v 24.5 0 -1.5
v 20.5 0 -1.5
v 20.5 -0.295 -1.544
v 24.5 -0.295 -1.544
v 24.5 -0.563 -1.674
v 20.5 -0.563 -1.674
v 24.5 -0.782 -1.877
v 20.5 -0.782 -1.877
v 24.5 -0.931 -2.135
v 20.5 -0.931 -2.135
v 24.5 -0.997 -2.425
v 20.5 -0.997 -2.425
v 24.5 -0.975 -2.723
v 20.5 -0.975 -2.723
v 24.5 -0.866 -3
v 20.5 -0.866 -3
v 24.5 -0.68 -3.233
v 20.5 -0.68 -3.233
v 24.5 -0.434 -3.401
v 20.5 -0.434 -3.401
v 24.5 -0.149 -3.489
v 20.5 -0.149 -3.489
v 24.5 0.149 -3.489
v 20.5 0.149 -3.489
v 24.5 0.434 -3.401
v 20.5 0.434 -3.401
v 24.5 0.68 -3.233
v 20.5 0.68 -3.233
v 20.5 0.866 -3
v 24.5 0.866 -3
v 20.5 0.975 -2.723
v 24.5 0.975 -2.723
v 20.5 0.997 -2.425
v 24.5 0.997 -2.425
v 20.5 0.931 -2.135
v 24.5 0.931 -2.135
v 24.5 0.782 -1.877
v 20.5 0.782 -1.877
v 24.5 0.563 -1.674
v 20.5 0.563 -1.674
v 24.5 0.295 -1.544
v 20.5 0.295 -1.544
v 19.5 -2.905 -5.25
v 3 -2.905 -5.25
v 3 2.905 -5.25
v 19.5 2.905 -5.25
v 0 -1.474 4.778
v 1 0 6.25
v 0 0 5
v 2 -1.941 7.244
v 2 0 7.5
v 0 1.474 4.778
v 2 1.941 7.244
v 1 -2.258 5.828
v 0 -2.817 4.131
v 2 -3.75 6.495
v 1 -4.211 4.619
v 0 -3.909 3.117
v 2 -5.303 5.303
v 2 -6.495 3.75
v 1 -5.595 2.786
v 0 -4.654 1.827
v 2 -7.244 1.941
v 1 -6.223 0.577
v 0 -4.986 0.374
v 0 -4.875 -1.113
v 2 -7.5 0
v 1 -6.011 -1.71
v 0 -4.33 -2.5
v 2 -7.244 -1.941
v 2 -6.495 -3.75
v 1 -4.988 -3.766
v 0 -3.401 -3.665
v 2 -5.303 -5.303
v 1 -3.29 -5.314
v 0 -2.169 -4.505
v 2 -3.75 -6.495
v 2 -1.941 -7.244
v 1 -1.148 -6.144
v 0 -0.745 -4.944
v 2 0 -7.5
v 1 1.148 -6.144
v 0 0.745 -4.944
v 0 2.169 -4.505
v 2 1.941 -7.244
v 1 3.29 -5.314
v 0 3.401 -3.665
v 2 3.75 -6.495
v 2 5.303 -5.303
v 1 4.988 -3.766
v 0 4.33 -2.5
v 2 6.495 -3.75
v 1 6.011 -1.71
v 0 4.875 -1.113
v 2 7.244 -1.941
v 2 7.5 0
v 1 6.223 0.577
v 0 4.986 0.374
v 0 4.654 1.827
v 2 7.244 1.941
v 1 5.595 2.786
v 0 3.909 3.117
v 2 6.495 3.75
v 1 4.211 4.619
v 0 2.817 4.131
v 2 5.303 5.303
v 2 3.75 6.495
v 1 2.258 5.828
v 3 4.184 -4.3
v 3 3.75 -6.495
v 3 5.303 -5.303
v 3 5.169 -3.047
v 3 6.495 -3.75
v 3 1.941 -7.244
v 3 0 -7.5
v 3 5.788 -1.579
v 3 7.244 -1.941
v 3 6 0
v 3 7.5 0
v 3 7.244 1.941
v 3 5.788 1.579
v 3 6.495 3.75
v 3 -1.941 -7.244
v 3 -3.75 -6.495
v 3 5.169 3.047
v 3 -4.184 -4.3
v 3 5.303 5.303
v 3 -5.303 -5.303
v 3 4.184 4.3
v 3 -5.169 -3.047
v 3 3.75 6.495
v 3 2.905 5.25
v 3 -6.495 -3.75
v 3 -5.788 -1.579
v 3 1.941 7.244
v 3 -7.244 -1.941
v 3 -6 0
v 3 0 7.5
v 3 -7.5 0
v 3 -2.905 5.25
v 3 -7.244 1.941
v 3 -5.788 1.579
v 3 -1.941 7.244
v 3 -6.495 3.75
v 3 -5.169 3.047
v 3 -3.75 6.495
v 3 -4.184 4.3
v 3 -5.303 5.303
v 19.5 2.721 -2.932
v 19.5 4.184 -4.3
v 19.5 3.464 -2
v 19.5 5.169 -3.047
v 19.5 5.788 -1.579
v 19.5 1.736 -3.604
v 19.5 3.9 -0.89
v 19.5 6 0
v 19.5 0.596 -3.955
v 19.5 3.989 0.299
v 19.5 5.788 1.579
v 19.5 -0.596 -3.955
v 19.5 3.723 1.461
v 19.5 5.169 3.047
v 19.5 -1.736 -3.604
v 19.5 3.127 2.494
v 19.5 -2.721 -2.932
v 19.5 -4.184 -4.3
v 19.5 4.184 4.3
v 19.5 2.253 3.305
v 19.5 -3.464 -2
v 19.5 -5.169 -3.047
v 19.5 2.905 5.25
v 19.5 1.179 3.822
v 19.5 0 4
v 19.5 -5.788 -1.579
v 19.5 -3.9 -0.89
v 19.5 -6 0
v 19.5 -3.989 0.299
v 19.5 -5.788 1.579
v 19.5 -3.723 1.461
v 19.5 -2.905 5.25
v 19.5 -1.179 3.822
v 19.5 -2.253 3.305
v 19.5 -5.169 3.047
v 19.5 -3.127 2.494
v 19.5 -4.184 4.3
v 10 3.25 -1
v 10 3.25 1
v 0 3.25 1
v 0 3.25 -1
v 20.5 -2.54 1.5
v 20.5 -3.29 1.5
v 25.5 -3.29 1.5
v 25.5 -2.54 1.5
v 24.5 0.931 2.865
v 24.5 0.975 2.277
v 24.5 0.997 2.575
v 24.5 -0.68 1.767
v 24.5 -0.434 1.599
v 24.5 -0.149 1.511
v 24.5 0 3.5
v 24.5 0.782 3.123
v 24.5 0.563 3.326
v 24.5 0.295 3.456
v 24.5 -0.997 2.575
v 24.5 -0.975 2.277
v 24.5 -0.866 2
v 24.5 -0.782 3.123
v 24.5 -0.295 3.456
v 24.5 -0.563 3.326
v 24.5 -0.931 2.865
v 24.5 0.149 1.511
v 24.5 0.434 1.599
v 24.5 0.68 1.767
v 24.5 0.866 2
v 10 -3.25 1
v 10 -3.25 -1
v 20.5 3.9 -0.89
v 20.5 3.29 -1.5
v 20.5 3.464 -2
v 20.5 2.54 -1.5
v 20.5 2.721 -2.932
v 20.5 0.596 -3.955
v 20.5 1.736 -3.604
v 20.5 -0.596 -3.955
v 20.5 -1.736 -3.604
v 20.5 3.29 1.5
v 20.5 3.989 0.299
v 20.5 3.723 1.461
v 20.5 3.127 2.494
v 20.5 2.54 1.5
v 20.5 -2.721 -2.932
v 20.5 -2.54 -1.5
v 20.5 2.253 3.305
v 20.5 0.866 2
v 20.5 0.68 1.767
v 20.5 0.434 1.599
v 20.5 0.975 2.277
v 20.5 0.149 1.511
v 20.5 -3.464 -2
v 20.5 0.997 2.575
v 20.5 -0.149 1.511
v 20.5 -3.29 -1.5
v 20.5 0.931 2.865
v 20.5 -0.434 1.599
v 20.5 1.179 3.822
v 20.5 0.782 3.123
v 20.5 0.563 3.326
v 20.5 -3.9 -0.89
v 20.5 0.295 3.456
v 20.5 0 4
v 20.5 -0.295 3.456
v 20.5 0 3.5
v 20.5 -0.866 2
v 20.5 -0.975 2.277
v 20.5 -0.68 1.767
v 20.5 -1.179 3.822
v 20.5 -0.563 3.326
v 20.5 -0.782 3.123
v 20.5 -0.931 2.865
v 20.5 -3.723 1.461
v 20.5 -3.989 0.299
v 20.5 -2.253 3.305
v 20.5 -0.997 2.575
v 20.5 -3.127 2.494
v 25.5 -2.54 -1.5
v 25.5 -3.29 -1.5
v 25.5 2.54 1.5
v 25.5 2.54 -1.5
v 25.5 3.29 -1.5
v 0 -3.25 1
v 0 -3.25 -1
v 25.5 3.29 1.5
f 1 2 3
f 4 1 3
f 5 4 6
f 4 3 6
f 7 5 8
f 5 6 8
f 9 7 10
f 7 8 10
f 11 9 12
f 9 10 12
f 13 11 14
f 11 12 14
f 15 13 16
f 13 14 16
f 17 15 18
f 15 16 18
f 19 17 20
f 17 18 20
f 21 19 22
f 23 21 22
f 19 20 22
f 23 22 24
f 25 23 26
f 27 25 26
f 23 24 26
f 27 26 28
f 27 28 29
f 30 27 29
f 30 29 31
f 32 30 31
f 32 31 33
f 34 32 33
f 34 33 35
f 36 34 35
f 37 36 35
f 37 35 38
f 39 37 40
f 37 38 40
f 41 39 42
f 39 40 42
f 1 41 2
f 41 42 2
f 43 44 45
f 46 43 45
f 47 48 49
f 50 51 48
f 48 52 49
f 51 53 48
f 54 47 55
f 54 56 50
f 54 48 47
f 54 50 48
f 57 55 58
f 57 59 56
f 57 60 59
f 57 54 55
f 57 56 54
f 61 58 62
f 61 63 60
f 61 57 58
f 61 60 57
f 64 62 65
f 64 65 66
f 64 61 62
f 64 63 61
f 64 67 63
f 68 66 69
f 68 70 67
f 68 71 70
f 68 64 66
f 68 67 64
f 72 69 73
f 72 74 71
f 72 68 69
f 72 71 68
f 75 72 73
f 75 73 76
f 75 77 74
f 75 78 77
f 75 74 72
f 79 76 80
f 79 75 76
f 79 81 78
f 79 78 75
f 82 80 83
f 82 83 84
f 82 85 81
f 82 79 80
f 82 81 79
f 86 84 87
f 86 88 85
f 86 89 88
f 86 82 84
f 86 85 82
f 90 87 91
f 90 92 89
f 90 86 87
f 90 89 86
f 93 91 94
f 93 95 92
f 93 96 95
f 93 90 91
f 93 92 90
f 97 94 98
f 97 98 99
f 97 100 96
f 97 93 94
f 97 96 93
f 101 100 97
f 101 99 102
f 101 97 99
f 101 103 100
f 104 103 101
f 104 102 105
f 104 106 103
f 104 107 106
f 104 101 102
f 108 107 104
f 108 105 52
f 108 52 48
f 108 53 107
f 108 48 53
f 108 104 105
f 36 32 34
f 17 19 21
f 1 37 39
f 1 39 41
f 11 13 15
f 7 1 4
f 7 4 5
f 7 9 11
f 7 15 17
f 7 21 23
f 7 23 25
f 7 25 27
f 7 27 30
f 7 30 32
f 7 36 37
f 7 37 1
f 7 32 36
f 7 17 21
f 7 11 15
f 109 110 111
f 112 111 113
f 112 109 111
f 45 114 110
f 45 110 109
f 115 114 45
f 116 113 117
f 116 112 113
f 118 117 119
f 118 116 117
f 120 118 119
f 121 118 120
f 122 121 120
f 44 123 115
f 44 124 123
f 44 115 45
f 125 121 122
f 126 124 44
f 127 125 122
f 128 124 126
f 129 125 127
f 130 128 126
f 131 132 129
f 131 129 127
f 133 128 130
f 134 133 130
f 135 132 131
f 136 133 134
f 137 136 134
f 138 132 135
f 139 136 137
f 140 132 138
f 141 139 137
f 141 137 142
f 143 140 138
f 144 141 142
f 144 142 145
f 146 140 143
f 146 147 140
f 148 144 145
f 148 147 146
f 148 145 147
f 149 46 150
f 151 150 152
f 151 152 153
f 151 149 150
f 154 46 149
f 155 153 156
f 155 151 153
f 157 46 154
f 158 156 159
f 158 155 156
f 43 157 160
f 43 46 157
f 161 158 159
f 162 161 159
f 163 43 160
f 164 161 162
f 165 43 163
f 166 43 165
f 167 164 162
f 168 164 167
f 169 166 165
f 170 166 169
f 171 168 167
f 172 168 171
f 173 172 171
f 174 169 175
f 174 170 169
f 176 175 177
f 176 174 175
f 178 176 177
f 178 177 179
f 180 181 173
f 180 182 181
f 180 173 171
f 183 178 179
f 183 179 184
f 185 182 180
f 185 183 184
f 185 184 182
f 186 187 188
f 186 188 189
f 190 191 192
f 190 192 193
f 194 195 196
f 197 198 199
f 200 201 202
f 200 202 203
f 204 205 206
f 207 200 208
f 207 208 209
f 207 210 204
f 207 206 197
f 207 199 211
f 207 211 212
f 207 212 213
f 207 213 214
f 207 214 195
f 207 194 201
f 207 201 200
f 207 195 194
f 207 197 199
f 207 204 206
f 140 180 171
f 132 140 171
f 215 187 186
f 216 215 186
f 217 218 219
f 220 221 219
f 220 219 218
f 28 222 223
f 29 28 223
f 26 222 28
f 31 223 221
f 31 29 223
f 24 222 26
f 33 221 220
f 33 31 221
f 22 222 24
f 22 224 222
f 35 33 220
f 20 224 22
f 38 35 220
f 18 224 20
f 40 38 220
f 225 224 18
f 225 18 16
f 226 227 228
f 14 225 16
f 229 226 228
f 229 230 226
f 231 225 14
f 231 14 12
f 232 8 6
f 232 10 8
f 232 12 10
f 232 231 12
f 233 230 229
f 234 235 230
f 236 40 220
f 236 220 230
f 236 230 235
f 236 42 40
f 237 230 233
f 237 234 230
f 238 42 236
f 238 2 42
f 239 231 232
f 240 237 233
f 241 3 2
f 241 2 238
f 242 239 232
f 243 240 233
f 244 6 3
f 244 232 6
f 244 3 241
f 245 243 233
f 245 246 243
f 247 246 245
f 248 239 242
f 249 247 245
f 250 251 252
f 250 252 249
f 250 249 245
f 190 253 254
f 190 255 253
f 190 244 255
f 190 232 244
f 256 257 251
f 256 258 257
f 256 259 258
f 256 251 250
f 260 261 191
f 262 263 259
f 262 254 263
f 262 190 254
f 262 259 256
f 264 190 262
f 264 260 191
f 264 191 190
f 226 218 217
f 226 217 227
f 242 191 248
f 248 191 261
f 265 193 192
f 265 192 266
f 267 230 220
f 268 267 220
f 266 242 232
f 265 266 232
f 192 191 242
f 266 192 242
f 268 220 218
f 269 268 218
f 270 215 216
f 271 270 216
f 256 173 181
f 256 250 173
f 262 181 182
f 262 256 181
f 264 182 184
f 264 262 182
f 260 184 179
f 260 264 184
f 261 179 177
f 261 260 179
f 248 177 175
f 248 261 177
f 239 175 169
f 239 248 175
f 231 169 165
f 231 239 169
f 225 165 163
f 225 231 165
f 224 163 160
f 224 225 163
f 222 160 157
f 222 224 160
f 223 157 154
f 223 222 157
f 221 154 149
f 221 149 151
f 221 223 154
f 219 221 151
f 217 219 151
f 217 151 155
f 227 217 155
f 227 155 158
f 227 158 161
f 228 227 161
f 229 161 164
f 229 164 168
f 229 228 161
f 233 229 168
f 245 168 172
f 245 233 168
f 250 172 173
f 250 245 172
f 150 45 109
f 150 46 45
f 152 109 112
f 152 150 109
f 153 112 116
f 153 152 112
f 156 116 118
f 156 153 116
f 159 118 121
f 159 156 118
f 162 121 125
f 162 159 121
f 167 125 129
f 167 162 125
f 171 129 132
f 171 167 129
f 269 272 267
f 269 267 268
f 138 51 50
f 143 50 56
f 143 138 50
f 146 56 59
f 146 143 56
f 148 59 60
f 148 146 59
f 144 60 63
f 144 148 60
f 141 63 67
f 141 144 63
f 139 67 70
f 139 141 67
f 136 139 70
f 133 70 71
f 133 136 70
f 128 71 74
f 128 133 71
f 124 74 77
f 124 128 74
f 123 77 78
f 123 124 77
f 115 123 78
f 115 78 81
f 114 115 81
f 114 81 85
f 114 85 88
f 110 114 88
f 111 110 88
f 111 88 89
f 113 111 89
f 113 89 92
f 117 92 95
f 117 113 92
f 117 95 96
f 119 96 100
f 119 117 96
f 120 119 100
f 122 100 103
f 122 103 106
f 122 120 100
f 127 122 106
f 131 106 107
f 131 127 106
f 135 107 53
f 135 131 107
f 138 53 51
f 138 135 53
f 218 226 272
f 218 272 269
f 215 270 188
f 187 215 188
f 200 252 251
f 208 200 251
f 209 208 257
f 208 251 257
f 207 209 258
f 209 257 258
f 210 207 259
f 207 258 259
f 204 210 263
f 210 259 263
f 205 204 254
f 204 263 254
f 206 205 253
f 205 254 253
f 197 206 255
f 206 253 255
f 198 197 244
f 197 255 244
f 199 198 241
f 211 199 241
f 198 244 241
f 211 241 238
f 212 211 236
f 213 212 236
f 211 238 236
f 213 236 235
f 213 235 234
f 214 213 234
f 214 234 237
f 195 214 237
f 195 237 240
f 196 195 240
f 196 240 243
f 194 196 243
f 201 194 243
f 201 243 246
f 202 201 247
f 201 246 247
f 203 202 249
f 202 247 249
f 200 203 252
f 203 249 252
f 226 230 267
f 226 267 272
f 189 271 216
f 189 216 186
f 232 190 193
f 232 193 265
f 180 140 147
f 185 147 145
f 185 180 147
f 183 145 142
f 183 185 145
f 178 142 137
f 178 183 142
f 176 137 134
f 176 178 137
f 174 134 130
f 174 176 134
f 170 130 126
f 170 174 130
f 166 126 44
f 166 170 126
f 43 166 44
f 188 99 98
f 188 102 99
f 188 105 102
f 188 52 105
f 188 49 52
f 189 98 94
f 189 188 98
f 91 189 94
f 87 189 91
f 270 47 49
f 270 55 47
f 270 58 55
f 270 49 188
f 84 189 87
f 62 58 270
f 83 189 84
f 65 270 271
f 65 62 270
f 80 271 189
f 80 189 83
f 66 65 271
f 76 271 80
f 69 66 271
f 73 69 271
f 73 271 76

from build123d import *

# Parameters (mm, degrees)
SKETCH_2_W          = 2
SKETCH_2_H          = 6.5
CUT_EXTRUDE_1_DEPTH = 10
SKETCH_3_W          = 5.751946122
SKETCH_3_H          = 18.448834599
CUT_EXTRUDE_2_DEPTH = 17.5
SKETCH_4_W          = 3
SKETCH_4_H          = 0.75
EXTRUDE_944_DEPTH   = 5
SKETCH_5_R          = 1
EXTRUDE_1_DEPTH     = 4


with BuildPart() as part:
    # 草图1 → 旋转1 (revolve)
    with BuildSketch(Plane.XY, mode=Mode.PRIVATE) as revolve_1_sk:
        Polygon((0, 0), (0, 5), (2, 7.5), (3, 7.5), (3, 6), (19.5, 6), (19.5, 4), (20.5, 4), (20.5, 0), align=None)
    revolve(revolve_1_sk.sketch.rotate(Axis((0, 0, 0), (1, 0, 0)), 90), axis=Axis((0, 0, 0), (1, 0, 0)))

    # 草图2 → 切除-拉伸1 (cut)
    with BuildSketch(Plane(origin=(0, 0, 0), x_dir=(0, 0, -1), z_dir=(1, 0, 0))):
        Rectangle(SKETCH_2_W, SKETCH_2_H)
    extrude(amount=CUT_EXTRUDE_1_DEPTH, mode=Mode.SUBTRACT)

    # 草图3 → 切除-拉伸2 (cut)
    with BuildSketch(Plane(origin=(20.5, 0, 0), x_dir=(0, 0, -1), z_dir=(1, 0, 0))):
        with Locations((-8.125973061, 0.639105125)):
            Rectangle(SKETCH_3_W, SKETCH_3_H)
        with Locations((8.125973061, 0.639105125)):
            Rectangle(SKETCH_3_W, SKETCH_3_H)
    extrude(amount=-CUT_EXTRUDE_2_DEPTH, mode=Mode.SUBTRACT)

    # 草图4 → Extrude 944 (add)
    with BuildSketch(Plane(origin=(20.5, 0, 0), x_dir=(0, 0, -1), z_dir=(1, 0, 0))):
        with Locations((0, 2.915)):
            Rectangle(SKETCH_4_W, SKETCH_4_H)
        with Locations((0, -2.915)):
            Rectangle(SKETCH_4_W, SKETCH_4_H)
    extrude(amount=EXTRUDE_944_DEPTH)

    # 草图5 → 凸台-拉伸1 (add)
    with BuildSketch(Plane(origin=(20.5, 0, 0), x_dir=(0, 0, -1), z_dir=(1, 0, 0))):
        with Locations(Location((-2.5, 0, 0), (0, 0, 180))):
            Circle(SKETCH_5_R)
        with Locations(Location((2.5, 0, 0), (0, 0, 180))):
            Circle(SKETCH_5_R)
    extrude(amount=EXTRUDE_1_DEPTH)


solid = part.part
